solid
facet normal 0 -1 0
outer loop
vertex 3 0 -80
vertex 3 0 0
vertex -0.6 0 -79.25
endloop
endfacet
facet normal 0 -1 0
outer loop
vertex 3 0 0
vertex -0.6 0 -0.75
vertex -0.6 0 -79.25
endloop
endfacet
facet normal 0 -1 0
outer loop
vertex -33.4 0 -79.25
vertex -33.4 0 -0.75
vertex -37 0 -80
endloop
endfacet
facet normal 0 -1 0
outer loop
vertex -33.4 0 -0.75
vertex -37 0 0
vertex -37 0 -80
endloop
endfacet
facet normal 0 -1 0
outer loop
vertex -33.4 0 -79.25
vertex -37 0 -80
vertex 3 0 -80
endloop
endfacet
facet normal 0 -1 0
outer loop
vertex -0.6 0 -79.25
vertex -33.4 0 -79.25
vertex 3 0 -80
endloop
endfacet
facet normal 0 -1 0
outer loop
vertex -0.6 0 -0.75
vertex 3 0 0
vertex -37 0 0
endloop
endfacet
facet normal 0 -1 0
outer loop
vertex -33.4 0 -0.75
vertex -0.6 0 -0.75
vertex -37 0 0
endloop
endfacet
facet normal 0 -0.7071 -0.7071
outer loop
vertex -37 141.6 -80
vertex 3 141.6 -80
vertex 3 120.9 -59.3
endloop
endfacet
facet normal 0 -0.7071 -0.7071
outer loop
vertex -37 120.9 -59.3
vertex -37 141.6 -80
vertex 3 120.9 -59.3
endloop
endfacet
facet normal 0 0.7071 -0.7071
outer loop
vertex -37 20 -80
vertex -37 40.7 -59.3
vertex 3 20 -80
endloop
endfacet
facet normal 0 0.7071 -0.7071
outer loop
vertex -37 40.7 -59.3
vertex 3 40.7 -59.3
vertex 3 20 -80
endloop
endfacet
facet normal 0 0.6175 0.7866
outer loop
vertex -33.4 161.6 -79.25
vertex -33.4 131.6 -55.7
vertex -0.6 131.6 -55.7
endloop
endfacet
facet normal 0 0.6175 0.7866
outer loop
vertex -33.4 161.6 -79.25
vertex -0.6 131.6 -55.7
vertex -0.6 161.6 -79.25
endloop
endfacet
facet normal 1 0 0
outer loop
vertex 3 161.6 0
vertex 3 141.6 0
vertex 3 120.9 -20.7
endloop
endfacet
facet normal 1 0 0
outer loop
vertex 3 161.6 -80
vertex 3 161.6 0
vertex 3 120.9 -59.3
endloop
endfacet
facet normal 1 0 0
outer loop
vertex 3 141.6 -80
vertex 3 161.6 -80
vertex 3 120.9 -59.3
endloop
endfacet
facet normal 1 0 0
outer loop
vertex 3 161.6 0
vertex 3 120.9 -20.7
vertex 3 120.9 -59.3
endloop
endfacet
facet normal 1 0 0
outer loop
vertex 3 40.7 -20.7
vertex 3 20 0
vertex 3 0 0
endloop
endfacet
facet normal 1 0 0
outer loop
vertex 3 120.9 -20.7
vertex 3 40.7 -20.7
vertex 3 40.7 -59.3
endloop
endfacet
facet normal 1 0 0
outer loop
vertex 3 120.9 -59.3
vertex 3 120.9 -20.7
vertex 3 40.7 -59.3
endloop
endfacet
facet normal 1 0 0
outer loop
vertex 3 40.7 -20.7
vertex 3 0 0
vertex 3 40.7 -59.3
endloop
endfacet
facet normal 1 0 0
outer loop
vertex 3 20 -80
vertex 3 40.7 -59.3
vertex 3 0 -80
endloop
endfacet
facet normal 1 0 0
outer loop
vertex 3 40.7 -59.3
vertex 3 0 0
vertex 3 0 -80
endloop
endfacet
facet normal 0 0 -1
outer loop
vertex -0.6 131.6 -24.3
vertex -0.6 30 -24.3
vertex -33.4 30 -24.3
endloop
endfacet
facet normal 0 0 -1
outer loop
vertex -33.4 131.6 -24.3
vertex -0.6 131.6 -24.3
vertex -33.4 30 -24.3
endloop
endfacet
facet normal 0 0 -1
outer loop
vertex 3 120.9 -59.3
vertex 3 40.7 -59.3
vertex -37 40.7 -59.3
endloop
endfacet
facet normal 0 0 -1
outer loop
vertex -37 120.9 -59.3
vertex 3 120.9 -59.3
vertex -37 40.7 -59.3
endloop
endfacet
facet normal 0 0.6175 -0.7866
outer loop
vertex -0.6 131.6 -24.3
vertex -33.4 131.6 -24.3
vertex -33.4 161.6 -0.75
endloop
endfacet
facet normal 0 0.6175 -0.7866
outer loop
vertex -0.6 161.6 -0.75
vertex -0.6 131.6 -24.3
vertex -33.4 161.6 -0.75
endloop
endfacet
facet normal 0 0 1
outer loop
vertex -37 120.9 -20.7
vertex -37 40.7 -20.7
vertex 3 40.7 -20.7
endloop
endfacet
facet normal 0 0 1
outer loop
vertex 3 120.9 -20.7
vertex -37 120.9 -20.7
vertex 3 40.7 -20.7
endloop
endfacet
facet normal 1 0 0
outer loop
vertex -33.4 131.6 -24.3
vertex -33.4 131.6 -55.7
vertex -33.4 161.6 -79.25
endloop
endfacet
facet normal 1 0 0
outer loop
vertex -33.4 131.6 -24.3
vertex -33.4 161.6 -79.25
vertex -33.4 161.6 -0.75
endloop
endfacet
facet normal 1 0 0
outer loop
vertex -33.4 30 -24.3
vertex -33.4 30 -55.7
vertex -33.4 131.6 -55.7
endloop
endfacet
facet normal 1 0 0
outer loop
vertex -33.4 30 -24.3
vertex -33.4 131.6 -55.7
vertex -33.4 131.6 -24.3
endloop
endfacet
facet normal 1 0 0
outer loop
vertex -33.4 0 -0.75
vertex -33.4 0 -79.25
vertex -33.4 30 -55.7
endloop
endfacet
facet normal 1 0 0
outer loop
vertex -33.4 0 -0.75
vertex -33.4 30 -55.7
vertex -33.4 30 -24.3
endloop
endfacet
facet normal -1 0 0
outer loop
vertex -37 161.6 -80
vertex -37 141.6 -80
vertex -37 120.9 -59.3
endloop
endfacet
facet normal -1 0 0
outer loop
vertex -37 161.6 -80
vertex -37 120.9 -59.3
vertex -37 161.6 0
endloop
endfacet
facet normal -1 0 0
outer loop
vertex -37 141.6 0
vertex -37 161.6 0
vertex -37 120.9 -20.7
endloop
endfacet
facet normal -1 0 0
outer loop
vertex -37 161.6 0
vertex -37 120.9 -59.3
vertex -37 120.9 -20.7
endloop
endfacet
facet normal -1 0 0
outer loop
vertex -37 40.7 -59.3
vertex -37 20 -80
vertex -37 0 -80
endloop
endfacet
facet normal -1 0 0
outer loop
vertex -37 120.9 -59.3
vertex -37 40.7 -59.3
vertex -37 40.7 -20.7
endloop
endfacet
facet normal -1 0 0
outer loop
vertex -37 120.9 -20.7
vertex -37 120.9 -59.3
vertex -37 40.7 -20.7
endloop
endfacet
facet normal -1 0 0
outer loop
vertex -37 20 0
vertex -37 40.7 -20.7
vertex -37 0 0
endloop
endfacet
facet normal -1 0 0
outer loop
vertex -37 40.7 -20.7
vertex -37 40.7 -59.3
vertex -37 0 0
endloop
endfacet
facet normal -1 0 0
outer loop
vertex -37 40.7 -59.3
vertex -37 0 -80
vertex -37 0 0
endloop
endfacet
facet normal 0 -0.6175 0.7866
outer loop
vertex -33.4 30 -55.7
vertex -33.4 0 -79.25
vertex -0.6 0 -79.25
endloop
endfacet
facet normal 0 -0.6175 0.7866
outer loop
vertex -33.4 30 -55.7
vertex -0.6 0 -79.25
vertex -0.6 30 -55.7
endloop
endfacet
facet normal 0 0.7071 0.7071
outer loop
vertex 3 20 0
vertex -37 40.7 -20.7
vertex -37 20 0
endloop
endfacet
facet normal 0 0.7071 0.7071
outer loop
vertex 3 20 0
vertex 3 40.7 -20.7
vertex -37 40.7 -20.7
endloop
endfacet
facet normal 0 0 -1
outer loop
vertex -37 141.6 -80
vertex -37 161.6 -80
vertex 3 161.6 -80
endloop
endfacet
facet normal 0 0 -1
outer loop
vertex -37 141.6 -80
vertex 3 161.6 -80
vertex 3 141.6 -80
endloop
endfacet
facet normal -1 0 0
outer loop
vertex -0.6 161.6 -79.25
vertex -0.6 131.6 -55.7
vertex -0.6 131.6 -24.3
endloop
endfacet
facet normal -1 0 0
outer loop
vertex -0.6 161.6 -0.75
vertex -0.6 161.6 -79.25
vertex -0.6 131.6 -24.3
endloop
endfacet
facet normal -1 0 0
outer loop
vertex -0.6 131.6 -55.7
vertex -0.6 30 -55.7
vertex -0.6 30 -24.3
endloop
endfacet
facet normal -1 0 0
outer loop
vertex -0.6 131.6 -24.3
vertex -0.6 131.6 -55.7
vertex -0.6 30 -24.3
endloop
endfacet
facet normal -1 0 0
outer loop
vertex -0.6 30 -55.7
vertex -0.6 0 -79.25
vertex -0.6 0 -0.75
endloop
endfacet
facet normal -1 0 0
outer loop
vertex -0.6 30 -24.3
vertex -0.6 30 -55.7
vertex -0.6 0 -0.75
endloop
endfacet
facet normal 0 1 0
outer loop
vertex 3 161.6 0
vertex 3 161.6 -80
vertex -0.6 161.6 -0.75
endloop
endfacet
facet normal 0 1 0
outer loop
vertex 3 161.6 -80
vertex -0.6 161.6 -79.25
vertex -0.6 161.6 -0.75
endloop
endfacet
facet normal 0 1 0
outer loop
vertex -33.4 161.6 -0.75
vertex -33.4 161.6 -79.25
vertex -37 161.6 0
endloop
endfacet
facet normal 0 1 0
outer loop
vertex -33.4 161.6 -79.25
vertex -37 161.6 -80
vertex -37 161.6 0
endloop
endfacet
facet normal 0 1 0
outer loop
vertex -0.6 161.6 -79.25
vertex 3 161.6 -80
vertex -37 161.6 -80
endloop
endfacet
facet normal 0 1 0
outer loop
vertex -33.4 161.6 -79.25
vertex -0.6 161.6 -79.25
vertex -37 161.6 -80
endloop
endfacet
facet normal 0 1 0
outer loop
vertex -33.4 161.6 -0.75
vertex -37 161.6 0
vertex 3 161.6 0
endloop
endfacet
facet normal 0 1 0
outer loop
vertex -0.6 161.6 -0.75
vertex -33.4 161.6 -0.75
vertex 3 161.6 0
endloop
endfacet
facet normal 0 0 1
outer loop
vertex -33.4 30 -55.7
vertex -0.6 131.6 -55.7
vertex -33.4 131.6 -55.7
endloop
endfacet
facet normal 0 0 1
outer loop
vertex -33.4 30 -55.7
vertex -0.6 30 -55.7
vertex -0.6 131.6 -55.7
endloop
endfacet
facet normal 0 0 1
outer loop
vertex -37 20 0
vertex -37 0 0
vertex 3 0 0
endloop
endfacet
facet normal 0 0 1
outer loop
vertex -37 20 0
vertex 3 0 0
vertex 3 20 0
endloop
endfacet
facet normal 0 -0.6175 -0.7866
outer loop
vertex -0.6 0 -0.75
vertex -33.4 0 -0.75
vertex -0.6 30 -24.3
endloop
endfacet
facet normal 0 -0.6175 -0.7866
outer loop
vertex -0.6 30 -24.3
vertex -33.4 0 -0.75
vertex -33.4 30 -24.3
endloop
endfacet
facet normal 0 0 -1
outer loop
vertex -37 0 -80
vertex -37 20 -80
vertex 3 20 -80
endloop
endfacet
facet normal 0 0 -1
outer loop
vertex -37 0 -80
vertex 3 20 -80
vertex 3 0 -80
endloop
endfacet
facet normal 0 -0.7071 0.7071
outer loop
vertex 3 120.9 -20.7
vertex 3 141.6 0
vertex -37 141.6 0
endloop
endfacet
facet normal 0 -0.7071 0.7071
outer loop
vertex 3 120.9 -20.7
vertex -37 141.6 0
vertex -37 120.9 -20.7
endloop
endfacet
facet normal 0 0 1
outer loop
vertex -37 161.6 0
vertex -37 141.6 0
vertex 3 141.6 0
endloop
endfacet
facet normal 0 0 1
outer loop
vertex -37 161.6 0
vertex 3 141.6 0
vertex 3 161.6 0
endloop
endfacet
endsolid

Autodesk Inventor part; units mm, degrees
ref_plane "YZ Plane" through (0, 0, 0) normal (1, 0, 0) x (0, 1, 0)
sketch "Sketch1" plane through (0, 0, 0) normal (0, 1, 0) x (-1, 0, 0)
  line L0 (0, 0) -> (34, 0)
  line L1 (34, 0) -> (34, -80)
  line L2 (34, -80) -> (0, -80)
  line L3 (0, -80) -> (0, 0)
  dimension "d0" = 34
  dimension "d1" = 80
extrude "Extrusion1" add sketch "Sketch1" along normal blind 30
ref_plane "Work Plane1" through (-17, 0, 0) normal (1, 0, 0) x (0, 0, -1)
sketch "Sketch2" plane through (-17, 0, 0) normal (1, 0, 0) x (0, 0, -1)
  line L0 (80, 30) -> (0, 30) projected
  line L1 (40, 30) -> (27.3, 30)
  line L2 (40, 30) -> (52.7, 30)
  line L3 (52.7, 30) -> (55.7, 30)
  line L4 (80, 0) -> (80, 30) projected
  line L5 (80, 0) -> (79.25, 0)
  line L6 (80, 0) -> (0, 0) projected
  line L7 (79.25, 0) -> (55.7, 30)
  line L8 (27.3, 30) -> (24.3, 30)
  line L9 (0, 0) -> (0.75, 0)
  line L10 (0.75, 0) -> (24.3, 30)
  line L11 (0.75, 0) -> (79.25, 0)
  dimension "d4" = 12.7
  dimension "d5" = 12.7
  dimension "d6" = 3
  dimension "d7" = 0.75
  dimension "d8" = 3
  dimension "d9" = 0.75
extrude "Extrusion2" cut sketch "Sketch2" along normal mid plane 32.8 contours L7 L6 L10 L0
sketch "Sketch3" plane through (-34, 0, -80) normal (-1, 0, 0) x (0, 0, 1)
  line L0 (80, 30) -> (0, 30) projected
  line L1 (0, 0) -> (80, 0) projected
  line L2 (0, 30) -> (80, 30)
  line L3 (80, 30) -> (80, 0)
  line L4 (80, 0) -> (0, 0)
  line L5 (0, 0) -> (0, 30)
extrude "Extrusion3" add sketch "Sketch3" along normal blind 3
sketch "Sketch4" plane through (0, 0, 0) normal (1, 0, 0) x (0, 0, -1)
  line L0 (0, 0) -> (0, 30) projected
  line L1 (0, 0) -> (80, 0) projected
  line L2 (0, 30) -> (80, 30)
  line L3 (80, 30) -> (80, 0)
  line L4 (80, 0) -> (0, 0)
  line L5 (0, 0) -> (0, 30)
extrude "Extrusion4" add sketch "Sketch4" along normal blind 3
sketch "Sketch5" plane through (3, 0, 0) normal (1, 0, 0) x (0, 0, -1)
  line L0 (0, 30) -> (80, 30) projected
  line L1 (0, 30) -> (0, 20)
  line L2 (0, 0) -> (0, 30) projected
  line L3 (0, 30) -> (10, 30)
  line L4 (10, 30) -> (0, 20)
  line L5 (80, 30) -> (80, 0) projected
  line L6 (80, 30) -> (80, 20)
  line L7 (80, 30) -> (70, 30)
  line L8 (70, 30) -> (80, 20)
  dimension "d16" = 10
  dimension "d17" = 10
  dimension "d18" = 10
extrude "Extrusion5" cut sketch "Sketch5" against normal through all
sketch "Sketch6" plane through (0, 30, 0) normal (0, 1, 0) x (1, 0, 0)
  line L0 (-0.6, 24.3) -> (-33.4, 24.3) projected
  line L1 (-0.6, 55.7) -> (-0.6, 24.3) projected
  line L2 (-33.4, 24.3) -> (-0.6, 24.3)
  line L3 (-0.6, 24.3) -> (-0.6, 55.7)
  line L4 (-0.6, 55.7) -> (-33.4, 55.7)
  line L5 (-33.4, 55.7) -> (-33.4, 24.3)
  line L6 (-37, 20.7) -> (3, 20.7)
  line L7 (3, 20.7) -> (3, 59.3)
  line L8 (3, 59.3) -> (-37, 59.3)
  line L9 (-37, 59.3) -> (-37, 20.7)
  point P0 (0, 0)
  dimension "d21" = 3.6
extrude "Extrusion6" add sketch "Sketch6" along normal blind 76.2
sketch "Sketch7" plane through (3, 0, 0) normal (1, 0, 0) x (0, 0, -1)
  line L0 (20.7, 30) -> (10, 30) projected
  line L1 (10, 30) -> (20.7, 40.7)
  line L2 (20.7, 30) -> (20.7, 106.2) projected
  line L3 (10, 30) -> (25.1321, 30) construction
  line L4 (20.7, 40.7) -> (20.7, 30)
  line L5 (20.7, 30) -> (10, 30)
  line L6 (70, 30) -> (59.3, 30) projected
  line L7 (70, 30) -> (59.3, 40.7)
  line L8 (59.3, 30) -> (59.3, 106.2) projected
  line L9 (59.3, 40.7) -> (59.3, 30)
  line L10 (70, 30) -> (80, 20) projected
  line L11 (59.3, 30) -> (70, 30)
  point P0 (0, 0)
  dimension "d24" = 45
extrude "Extrusion7" add sketch "Sketch7" against normal up to surface (40 mm away)
ref_plane "Work Plane2" through (0, 80.8, 0) normal (0, 1, 0) x (1, 0, 0)
mirror "Mirror1" about plane through (0, 80.8, 0) normal (0, 1, 0)
properties part number "Bone_Cover"
